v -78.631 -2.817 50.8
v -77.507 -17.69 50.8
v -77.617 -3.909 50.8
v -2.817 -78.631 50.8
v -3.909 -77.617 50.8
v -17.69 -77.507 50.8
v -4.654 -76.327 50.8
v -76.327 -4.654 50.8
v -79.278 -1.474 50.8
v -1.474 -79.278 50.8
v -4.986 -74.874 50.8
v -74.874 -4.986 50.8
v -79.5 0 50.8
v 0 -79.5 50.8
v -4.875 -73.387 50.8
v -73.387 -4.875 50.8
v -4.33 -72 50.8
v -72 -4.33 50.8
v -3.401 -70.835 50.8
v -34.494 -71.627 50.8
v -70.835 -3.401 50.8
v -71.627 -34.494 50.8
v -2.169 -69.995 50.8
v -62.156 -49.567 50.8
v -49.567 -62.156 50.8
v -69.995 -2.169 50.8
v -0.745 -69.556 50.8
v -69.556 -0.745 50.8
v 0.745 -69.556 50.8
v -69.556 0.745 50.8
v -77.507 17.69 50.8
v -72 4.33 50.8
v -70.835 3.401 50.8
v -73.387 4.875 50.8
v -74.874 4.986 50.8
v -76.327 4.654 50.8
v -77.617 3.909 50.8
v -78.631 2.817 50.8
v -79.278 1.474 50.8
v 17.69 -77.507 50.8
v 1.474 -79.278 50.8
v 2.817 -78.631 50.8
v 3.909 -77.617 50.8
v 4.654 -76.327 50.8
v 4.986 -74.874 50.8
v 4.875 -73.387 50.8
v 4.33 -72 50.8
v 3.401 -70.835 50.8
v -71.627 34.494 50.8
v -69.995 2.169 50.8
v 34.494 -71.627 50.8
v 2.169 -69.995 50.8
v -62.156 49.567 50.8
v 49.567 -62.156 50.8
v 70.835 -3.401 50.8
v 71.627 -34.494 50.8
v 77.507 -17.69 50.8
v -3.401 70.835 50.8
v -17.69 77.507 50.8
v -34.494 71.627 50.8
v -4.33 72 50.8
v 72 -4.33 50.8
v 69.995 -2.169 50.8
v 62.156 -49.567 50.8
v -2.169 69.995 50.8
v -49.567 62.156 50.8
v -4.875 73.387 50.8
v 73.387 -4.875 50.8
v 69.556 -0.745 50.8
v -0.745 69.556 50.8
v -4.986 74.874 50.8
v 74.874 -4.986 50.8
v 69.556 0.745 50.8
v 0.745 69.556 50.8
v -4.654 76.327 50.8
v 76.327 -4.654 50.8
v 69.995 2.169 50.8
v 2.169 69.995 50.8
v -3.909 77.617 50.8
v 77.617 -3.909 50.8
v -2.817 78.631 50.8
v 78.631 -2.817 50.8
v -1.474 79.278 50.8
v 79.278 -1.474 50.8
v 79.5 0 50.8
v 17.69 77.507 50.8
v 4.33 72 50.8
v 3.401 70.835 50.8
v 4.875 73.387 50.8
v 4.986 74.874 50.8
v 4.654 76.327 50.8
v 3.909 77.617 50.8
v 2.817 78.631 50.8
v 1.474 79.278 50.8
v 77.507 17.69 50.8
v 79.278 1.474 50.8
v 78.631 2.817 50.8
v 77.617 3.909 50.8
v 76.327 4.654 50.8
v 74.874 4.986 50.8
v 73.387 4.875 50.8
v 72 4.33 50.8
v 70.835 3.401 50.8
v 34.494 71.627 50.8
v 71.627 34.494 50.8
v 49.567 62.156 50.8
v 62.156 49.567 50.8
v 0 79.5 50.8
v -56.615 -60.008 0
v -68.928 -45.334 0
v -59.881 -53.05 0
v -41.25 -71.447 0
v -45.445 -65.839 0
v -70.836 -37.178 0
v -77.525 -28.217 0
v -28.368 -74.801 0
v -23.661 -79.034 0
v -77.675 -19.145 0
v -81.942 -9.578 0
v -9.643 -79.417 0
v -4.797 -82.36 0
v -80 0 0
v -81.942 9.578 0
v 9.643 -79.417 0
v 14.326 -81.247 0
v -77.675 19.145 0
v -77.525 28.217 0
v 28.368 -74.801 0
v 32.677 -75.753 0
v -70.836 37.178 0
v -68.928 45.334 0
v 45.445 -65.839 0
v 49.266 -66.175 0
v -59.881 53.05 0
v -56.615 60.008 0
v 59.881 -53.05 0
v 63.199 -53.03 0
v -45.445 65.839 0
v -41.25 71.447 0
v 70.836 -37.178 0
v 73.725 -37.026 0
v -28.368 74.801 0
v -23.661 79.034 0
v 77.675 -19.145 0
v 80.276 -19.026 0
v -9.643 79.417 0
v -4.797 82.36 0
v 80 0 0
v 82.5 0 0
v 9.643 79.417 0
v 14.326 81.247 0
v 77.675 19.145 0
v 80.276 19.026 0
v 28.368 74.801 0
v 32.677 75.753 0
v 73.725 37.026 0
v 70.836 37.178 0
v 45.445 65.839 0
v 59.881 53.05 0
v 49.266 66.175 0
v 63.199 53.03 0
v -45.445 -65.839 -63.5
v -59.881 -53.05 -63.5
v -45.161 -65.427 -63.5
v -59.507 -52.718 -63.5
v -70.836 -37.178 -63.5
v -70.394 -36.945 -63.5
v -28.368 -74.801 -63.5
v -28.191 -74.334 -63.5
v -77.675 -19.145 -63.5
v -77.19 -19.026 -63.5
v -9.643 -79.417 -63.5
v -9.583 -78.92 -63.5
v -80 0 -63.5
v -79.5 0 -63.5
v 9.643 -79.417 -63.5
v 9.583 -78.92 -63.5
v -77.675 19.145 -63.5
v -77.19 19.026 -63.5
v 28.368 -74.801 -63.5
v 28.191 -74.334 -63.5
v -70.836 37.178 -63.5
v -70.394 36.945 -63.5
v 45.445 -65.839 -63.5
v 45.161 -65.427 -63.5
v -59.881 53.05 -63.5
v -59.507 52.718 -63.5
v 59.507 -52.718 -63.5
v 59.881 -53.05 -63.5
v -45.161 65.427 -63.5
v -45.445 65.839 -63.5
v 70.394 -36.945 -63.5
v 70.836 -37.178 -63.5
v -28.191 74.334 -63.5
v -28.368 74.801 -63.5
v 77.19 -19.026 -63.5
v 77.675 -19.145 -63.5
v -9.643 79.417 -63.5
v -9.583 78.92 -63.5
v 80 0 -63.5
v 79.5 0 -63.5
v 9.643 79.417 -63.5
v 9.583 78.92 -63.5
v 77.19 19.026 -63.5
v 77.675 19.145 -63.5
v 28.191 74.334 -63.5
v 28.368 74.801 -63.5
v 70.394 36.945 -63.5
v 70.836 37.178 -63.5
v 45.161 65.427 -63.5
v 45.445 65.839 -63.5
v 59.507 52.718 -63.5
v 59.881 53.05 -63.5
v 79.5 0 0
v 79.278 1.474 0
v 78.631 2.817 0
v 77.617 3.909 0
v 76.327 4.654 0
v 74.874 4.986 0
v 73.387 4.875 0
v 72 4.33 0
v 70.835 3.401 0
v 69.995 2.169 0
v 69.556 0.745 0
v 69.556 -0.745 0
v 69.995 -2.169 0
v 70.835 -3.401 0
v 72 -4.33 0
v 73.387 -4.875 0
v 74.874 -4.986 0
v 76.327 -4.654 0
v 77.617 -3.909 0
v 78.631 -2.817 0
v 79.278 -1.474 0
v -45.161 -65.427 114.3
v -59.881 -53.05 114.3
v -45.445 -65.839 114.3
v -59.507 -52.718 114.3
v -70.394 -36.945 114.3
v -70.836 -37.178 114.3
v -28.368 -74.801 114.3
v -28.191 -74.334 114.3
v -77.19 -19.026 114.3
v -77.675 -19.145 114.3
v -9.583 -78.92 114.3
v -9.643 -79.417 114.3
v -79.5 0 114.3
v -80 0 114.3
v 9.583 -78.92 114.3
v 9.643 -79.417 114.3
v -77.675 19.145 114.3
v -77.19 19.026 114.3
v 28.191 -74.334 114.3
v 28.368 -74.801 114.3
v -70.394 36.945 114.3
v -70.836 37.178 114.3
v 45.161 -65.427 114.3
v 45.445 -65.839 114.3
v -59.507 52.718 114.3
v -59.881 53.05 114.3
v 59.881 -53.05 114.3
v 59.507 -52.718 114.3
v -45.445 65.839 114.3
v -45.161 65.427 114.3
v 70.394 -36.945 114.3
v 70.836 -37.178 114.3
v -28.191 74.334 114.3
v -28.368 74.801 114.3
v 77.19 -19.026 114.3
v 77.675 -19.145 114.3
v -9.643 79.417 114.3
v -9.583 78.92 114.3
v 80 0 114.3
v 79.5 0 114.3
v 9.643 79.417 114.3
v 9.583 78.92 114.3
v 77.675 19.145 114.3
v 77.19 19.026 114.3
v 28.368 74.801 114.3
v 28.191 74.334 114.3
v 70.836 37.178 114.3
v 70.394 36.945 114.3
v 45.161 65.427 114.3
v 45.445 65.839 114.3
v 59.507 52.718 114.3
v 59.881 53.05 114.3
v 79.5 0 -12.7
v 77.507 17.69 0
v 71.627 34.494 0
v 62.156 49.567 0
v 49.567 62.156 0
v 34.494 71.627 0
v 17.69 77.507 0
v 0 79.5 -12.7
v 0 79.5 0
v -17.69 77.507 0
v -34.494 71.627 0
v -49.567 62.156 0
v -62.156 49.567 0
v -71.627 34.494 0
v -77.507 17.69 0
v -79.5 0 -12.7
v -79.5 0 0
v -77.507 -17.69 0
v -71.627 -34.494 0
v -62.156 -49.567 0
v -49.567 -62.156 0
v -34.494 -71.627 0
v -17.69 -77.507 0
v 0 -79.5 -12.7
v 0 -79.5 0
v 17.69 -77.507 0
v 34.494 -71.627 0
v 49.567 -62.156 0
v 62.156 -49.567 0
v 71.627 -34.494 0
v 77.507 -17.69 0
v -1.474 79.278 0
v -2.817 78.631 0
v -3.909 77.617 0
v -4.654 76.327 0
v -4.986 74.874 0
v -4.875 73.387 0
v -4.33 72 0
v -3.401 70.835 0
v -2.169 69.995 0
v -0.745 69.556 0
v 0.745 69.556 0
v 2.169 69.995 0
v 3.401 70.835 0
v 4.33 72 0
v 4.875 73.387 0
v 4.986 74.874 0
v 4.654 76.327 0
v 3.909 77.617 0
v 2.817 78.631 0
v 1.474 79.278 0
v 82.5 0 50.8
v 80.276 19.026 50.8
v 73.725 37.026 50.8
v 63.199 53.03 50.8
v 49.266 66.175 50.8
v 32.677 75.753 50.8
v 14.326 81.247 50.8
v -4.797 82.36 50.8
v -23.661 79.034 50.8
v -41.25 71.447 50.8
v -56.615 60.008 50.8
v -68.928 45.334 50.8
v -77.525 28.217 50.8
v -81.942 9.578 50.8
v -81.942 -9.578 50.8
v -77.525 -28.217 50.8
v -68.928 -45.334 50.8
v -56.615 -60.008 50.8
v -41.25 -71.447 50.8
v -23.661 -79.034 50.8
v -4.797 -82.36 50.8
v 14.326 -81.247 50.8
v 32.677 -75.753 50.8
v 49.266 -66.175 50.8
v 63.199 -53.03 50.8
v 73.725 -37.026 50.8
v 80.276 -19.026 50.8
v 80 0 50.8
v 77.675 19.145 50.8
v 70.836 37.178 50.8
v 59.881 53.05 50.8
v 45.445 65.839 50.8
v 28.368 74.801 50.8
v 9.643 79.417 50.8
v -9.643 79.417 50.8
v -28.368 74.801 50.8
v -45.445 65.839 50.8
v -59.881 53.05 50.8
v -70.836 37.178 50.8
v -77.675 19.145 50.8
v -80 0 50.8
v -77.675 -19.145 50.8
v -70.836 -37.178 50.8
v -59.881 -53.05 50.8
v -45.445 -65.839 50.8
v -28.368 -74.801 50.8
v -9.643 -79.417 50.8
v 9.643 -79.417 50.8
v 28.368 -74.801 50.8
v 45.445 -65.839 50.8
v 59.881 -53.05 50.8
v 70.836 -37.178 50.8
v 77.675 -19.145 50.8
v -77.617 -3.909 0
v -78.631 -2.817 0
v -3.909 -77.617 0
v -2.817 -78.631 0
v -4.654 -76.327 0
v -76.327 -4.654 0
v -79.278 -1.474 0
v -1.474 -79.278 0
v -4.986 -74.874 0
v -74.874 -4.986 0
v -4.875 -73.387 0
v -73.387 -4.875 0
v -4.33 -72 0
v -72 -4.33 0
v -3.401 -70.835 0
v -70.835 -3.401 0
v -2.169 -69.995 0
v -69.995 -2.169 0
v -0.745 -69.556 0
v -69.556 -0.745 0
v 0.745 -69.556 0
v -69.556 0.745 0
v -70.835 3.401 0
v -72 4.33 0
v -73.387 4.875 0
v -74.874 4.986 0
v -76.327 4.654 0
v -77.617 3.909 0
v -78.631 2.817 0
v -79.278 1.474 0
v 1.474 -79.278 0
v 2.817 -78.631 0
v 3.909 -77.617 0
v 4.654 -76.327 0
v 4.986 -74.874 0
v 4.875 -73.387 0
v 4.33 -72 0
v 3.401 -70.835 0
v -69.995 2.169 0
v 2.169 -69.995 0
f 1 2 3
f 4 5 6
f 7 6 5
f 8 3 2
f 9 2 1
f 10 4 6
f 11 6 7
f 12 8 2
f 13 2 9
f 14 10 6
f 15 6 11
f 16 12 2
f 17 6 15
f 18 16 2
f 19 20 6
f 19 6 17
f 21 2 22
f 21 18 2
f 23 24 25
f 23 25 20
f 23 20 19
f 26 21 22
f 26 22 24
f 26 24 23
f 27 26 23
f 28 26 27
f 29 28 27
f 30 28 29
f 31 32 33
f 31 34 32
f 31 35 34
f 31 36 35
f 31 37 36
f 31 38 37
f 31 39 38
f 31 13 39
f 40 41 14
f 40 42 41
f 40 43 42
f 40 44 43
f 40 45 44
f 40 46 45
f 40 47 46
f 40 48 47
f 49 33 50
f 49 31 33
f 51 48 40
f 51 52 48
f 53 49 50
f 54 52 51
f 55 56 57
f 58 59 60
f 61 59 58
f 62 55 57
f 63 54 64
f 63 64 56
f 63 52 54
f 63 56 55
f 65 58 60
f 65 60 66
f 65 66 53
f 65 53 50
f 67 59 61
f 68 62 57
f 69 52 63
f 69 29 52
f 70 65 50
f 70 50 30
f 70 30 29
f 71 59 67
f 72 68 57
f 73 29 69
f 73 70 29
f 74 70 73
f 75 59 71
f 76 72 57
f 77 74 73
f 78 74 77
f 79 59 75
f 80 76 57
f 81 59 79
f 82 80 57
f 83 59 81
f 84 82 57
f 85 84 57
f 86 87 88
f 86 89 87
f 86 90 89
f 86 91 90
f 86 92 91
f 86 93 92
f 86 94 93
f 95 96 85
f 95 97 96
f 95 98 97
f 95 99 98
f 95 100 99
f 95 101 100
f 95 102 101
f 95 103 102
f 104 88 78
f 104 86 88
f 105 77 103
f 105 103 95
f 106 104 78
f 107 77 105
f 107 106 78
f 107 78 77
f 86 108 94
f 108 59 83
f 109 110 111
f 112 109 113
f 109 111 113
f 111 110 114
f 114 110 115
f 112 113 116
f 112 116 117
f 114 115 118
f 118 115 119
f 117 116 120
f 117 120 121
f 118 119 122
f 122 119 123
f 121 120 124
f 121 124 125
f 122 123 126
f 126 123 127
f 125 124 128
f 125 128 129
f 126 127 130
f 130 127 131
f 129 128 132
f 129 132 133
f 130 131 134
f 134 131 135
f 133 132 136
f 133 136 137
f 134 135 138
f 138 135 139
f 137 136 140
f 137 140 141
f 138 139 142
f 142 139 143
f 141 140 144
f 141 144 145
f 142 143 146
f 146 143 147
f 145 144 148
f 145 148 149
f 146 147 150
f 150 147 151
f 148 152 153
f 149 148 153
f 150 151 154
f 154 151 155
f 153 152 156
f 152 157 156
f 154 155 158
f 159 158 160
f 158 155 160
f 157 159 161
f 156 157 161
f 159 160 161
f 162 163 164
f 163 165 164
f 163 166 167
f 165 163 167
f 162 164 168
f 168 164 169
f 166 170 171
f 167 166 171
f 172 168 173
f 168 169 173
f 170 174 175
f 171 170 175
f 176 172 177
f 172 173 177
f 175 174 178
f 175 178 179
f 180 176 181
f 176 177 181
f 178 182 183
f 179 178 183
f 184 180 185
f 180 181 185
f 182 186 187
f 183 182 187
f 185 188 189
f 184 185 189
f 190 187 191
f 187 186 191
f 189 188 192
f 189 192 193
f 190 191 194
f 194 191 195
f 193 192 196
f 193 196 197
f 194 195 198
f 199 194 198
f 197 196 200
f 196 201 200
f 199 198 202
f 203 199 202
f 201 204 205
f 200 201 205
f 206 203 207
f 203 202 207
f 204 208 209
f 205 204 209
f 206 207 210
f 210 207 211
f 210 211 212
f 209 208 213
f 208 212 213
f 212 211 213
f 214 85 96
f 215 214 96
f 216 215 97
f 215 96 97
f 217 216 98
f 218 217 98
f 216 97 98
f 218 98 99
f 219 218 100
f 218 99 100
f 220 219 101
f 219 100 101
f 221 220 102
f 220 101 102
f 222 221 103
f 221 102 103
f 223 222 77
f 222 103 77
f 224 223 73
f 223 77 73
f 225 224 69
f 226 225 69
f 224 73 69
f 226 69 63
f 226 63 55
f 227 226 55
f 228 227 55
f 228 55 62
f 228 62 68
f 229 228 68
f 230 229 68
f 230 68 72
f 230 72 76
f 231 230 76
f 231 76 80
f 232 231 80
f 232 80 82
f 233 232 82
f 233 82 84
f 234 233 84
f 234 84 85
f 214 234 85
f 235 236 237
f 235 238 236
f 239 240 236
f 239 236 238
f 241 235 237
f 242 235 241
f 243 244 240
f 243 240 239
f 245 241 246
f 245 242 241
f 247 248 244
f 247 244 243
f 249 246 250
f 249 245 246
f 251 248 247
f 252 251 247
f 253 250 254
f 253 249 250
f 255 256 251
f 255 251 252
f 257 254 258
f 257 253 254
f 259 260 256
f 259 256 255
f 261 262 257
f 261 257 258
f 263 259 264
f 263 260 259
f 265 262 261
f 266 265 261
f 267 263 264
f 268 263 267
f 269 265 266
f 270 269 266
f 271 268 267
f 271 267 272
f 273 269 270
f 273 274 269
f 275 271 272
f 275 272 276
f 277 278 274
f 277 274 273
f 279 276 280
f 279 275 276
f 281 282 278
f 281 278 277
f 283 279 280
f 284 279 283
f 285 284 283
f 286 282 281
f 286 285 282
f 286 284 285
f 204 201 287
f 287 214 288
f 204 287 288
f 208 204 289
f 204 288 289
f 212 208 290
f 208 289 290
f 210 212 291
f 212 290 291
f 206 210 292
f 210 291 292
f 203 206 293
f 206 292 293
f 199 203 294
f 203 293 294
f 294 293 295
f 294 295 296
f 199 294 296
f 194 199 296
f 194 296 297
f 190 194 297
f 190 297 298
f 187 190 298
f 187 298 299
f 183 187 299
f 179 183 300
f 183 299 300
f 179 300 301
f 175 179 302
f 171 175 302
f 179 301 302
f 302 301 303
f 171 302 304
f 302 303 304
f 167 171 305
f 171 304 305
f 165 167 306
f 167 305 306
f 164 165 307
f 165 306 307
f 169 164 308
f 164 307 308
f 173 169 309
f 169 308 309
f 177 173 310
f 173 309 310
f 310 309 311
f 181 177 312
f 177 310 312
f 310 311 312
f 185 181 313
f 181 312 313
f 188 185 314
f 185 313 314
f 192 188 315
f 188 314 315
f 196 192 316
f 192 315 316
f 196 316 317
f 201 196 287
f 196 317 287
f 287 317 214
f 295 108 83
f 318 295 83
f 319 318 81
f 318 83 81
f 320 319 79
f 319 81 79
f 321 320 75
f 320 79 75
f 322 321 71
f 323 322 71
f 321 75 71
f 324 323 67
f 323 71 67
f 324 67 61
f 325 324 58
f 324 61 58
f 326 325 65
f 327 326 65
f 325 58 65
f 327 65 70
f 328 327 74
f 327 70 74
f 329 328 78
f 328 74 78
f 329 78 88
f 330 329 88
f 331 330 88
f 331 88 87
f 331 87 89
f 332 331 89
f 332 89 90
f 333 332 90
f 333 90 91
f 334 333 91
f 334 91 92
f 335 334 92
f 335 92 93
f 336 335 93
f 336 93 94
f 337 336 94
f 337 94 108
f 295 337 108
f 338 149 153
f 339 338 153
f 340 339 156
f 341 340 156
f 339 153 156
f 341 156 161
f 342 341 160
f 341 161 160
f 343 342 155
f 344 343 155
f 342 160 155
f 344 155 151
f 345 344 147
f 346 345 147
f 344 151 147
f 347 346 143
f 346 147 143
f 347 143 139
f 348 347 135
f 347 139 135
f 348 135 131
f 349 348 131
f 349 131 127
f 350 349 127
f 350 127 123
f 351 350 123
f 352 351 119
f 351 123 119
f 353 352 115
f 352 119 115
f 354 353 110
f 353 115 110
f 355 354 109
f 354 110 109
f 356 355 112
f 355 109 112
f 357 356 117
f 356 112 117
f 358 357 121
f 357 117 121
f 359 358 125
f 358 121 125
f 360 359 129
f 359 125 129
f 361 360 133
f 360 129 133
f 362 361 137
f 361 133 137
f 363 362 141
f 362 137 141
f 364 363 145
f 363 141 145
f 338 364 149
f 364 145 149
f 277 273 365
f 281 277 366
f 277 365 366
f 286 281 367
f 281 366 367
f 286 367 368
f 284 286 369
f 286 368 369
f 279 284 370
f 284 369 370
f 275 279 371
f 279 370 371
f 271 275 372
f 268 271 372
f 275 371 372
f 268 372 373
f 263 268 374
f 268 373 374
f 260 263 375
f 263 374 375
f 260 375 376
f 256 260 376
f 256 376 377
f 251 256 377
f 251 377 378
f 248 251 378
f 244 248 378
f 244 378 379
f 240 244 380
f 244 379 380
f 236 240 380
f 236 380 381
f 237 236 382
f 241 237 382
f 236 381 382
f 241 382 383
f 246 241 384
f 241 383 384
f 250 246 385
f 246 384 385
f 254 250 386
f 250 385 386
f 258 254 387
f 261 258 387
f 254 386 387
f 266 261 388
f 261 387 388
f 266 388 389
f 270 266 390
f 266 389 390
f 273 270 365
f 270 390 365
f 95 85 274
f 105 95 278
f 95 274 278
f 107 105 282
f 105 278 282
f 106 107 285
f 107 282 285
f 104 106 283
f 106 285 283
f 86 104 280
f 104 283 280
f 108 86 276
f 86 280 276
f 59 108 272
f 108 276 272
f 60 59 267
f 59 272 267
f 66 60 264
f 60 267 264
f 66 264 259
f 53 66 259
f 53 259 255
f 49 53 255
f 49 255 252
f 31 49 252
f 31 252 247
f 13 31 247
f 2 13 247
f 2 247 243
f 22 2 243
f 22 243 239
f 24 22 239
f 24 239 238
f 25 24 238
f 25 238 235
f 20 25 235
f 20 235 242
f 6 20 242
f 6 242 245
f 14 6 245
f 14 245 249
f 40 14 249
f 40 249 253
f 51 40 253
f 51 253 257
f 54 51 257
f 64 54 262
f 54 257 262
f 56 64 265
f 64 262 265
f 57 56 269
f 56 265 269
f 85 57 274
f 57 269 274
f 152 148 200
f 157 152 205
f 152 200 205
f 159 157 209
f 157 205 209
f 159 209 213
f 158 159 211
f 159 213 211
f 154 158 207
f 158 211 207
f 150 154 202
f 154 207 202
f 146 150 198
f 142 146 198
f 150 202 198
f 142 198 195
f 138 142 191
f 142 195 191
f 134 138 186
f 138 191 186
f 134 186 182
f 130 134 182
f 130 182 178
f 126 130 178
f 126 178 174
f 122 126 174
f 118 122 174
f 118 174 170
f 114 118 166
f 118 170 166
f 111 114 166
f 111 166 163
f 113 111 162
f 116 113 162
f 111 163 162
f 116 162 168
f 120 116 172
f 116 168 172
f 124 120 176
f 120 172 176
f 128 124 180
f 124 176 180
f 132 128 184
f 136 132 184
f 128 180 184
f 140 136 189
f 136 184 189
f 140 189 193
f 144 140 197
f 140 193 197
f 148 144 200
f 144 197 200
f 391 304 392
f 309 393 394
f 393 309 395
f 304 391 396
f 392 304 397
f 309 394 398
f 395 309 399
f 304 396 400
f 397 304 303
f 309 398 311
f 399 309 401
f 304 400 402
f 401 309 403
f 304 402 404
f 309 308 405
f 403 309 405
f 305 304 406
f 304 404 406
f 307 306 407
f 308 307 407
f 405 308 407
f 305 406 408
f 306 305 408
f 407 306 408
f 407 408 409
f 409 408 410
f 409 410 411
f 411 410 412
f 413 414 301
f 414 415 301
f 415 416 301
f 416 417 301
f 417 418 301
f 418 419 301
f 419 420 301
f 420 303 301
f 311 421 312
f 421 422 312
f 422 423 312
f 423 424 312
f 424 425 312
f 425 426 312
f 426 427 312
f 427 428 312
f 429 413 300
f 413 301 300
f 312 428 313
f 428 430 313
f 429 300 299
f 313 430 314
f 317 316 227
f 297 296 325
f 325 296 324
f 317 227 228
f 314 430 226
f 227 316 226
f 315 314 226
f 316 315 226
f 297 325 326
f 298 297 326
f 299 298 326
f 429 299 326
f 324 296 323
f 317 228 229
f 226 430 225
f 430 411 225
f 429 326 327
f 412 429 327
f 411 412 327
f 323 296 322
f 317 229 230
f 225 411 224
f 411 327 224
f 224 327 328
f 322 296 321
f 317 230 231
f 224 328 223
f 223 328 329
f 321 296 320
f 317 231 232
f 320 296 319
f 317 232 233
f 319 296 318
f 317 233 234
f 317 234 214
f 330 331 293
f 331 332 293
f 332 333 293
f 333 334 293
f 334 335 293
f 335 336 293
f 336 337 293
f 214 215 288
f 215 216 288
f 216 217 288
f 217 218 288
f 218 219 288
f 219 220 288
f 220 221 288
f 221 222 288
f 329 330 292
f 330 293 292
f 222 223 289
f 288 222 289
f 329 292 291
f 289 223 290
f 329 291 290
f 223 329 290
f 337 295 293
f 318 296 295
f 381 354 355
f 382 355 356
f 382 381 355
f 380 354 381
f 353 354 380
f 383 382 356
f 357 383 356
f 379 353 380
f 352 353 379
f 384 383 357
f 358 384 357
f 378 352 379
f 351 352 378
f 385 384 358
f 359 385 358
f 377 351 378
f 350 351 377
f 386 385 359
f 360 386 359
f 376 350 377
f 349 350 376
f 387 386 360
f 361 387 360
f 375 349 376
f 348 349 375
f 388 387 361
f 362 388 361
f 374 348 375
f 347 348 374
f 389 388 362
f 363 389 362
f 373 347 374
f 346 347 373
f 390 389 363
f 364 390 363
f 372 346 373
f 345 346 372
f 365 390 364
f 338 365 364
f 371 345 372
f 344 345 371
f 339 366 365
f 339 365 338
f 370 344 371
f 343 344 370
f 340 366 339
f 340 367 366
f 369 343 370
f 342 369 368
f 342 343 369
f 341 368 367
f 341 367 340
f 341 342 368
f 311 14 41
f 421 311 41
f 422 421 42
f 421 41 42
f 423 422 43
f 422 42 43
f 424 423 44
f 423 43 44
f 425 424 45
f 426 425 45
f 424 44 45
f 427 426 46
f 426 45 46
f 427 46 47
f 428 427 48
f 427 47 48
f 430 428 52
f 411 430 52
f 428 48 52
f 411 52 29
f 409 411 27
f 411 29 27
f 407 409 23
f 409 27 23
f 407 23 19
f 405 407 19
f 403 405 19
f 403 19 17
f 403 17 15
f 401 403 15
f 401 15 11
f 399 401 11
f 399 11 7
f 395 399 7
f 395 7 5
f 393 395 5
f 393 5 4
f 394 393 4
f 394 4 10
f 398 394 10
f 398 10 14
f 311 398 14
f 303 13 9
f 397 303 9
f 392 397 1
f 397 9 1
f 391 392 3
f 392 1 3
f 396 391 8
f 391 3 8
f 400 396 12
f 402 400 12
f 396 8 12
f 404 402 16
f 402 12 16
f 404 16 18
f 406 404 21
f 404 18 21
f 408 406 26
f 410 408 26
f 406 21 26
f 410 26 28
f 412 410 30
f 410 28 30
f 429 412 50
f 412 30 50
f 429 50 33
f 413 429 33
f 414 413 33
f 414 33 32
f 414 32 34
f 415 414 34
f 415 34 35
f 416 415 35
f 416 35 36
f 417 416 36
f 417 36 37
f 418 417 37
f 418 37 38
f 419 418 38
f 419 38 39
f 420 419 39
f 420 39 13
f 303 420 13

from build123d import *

# Parameters (mm, degrees)
SKETCH1_R           = 82.5
BOSS_EXTRUDE2_DEPTH = 50.8
SKETCH2_R           = 80
BOSS_EXTRUDE3_DEPTH = 63.5
BOSS_EXTRUDE4_START = -63.5
SKETCH3_R           = 80
BOSS_EXTRUDE4_DEPTH = 63.5
SKETCH7_R           = 79.5
CUT_EXTRUDE1_DEPTH  = 63.5
CUT_EXTRUDE2_START  = 63.5
SKETCH8_R           = 79.5
CUT_EXTRUDE2_DEPTH  = 63.5
SKETCH10_R          = 5
CUT_EXTRUDE3_DEPTH  = 63.5


with BuildPart() as part:
    # Sketch1 → Boss-Extrude2 (new body)
    with BuildSketch(Plane.XY):
        Circle(SKETCH1_R)
    extrude(amount=BOSS_EXTRUDE2_DEPTH)

    # Sketch2 → Boss-Extrude3 (add)
    with BuildSketch(Plane.XY.offset(50.8)):
        Circle(SKETCH2_R)
    extrude(amount=BOSS_EXTRUDE3_DEPTH)

    # Sketch3 → Boss-Extrude4 (add)
    with BuildSketch(Plane.XY.offset(BOSS_EXTRUDE4_START)):
        Circle(SKETCH3_R)
    extrude(amount=BOSS_EXTRUDE4_DEPTH)

    # Sketch7 → Cut-Extrude1 (cut)
    with BuildSketch(Plane.XY.offset(114.3)):
        Circle(SKETCH7_R)
    extrude(amount=-CUT_EXTRUDE1_DEPTH, mode=Mode.SUBTRACT)

    # Sketch8 → Cut-Extrude2 (cut)
    with BuildSketch(Plane.XY.offset(-63.5).offset(CUT_EXTRUDE2_START)):
        Circle(SKETCH8_R)
    extrude(amount=-CUT_EXTRUDE2_DEPTH, mode=Mode.SUBTRACT)

    # Sketch10 → Cut-Extrude3 (cut)
    with BuildSketch(Plane.XY.offset(50.8)):
        with Locations(Location((0, 74.5, 0), (0, 0, 90.000374339))):
            Circle(SKETCH10_R)
        with Locations(Location((74.5, 0, 0), (0, 0, 0.000381298))):
            Circle(SKETCH10_R)
        with Locations(Location((0, -74.5, 0), (0, 0, 270.000382713))):
            Circle(SKETCH10_R)
        with Locations(Location((-74.5, 0, 0), (0, 0, 179.999623258))):
            Circle(SKETCH10_R)
    extrude(amount=-CUT_EXTRUDE3_DEPTH, mode=Mode.SUBTRACT)


with BuildPart() as cut_extrude3_kept_piece:
    # of the separate pieces the step leaves, the one the design keeps (cut_extrude3_pieces_kept)
    add(part.part.solids().sort_by_distance((82.5, 0, 50.8))[0])


solid = cut_extrude3_kept_piece.part
